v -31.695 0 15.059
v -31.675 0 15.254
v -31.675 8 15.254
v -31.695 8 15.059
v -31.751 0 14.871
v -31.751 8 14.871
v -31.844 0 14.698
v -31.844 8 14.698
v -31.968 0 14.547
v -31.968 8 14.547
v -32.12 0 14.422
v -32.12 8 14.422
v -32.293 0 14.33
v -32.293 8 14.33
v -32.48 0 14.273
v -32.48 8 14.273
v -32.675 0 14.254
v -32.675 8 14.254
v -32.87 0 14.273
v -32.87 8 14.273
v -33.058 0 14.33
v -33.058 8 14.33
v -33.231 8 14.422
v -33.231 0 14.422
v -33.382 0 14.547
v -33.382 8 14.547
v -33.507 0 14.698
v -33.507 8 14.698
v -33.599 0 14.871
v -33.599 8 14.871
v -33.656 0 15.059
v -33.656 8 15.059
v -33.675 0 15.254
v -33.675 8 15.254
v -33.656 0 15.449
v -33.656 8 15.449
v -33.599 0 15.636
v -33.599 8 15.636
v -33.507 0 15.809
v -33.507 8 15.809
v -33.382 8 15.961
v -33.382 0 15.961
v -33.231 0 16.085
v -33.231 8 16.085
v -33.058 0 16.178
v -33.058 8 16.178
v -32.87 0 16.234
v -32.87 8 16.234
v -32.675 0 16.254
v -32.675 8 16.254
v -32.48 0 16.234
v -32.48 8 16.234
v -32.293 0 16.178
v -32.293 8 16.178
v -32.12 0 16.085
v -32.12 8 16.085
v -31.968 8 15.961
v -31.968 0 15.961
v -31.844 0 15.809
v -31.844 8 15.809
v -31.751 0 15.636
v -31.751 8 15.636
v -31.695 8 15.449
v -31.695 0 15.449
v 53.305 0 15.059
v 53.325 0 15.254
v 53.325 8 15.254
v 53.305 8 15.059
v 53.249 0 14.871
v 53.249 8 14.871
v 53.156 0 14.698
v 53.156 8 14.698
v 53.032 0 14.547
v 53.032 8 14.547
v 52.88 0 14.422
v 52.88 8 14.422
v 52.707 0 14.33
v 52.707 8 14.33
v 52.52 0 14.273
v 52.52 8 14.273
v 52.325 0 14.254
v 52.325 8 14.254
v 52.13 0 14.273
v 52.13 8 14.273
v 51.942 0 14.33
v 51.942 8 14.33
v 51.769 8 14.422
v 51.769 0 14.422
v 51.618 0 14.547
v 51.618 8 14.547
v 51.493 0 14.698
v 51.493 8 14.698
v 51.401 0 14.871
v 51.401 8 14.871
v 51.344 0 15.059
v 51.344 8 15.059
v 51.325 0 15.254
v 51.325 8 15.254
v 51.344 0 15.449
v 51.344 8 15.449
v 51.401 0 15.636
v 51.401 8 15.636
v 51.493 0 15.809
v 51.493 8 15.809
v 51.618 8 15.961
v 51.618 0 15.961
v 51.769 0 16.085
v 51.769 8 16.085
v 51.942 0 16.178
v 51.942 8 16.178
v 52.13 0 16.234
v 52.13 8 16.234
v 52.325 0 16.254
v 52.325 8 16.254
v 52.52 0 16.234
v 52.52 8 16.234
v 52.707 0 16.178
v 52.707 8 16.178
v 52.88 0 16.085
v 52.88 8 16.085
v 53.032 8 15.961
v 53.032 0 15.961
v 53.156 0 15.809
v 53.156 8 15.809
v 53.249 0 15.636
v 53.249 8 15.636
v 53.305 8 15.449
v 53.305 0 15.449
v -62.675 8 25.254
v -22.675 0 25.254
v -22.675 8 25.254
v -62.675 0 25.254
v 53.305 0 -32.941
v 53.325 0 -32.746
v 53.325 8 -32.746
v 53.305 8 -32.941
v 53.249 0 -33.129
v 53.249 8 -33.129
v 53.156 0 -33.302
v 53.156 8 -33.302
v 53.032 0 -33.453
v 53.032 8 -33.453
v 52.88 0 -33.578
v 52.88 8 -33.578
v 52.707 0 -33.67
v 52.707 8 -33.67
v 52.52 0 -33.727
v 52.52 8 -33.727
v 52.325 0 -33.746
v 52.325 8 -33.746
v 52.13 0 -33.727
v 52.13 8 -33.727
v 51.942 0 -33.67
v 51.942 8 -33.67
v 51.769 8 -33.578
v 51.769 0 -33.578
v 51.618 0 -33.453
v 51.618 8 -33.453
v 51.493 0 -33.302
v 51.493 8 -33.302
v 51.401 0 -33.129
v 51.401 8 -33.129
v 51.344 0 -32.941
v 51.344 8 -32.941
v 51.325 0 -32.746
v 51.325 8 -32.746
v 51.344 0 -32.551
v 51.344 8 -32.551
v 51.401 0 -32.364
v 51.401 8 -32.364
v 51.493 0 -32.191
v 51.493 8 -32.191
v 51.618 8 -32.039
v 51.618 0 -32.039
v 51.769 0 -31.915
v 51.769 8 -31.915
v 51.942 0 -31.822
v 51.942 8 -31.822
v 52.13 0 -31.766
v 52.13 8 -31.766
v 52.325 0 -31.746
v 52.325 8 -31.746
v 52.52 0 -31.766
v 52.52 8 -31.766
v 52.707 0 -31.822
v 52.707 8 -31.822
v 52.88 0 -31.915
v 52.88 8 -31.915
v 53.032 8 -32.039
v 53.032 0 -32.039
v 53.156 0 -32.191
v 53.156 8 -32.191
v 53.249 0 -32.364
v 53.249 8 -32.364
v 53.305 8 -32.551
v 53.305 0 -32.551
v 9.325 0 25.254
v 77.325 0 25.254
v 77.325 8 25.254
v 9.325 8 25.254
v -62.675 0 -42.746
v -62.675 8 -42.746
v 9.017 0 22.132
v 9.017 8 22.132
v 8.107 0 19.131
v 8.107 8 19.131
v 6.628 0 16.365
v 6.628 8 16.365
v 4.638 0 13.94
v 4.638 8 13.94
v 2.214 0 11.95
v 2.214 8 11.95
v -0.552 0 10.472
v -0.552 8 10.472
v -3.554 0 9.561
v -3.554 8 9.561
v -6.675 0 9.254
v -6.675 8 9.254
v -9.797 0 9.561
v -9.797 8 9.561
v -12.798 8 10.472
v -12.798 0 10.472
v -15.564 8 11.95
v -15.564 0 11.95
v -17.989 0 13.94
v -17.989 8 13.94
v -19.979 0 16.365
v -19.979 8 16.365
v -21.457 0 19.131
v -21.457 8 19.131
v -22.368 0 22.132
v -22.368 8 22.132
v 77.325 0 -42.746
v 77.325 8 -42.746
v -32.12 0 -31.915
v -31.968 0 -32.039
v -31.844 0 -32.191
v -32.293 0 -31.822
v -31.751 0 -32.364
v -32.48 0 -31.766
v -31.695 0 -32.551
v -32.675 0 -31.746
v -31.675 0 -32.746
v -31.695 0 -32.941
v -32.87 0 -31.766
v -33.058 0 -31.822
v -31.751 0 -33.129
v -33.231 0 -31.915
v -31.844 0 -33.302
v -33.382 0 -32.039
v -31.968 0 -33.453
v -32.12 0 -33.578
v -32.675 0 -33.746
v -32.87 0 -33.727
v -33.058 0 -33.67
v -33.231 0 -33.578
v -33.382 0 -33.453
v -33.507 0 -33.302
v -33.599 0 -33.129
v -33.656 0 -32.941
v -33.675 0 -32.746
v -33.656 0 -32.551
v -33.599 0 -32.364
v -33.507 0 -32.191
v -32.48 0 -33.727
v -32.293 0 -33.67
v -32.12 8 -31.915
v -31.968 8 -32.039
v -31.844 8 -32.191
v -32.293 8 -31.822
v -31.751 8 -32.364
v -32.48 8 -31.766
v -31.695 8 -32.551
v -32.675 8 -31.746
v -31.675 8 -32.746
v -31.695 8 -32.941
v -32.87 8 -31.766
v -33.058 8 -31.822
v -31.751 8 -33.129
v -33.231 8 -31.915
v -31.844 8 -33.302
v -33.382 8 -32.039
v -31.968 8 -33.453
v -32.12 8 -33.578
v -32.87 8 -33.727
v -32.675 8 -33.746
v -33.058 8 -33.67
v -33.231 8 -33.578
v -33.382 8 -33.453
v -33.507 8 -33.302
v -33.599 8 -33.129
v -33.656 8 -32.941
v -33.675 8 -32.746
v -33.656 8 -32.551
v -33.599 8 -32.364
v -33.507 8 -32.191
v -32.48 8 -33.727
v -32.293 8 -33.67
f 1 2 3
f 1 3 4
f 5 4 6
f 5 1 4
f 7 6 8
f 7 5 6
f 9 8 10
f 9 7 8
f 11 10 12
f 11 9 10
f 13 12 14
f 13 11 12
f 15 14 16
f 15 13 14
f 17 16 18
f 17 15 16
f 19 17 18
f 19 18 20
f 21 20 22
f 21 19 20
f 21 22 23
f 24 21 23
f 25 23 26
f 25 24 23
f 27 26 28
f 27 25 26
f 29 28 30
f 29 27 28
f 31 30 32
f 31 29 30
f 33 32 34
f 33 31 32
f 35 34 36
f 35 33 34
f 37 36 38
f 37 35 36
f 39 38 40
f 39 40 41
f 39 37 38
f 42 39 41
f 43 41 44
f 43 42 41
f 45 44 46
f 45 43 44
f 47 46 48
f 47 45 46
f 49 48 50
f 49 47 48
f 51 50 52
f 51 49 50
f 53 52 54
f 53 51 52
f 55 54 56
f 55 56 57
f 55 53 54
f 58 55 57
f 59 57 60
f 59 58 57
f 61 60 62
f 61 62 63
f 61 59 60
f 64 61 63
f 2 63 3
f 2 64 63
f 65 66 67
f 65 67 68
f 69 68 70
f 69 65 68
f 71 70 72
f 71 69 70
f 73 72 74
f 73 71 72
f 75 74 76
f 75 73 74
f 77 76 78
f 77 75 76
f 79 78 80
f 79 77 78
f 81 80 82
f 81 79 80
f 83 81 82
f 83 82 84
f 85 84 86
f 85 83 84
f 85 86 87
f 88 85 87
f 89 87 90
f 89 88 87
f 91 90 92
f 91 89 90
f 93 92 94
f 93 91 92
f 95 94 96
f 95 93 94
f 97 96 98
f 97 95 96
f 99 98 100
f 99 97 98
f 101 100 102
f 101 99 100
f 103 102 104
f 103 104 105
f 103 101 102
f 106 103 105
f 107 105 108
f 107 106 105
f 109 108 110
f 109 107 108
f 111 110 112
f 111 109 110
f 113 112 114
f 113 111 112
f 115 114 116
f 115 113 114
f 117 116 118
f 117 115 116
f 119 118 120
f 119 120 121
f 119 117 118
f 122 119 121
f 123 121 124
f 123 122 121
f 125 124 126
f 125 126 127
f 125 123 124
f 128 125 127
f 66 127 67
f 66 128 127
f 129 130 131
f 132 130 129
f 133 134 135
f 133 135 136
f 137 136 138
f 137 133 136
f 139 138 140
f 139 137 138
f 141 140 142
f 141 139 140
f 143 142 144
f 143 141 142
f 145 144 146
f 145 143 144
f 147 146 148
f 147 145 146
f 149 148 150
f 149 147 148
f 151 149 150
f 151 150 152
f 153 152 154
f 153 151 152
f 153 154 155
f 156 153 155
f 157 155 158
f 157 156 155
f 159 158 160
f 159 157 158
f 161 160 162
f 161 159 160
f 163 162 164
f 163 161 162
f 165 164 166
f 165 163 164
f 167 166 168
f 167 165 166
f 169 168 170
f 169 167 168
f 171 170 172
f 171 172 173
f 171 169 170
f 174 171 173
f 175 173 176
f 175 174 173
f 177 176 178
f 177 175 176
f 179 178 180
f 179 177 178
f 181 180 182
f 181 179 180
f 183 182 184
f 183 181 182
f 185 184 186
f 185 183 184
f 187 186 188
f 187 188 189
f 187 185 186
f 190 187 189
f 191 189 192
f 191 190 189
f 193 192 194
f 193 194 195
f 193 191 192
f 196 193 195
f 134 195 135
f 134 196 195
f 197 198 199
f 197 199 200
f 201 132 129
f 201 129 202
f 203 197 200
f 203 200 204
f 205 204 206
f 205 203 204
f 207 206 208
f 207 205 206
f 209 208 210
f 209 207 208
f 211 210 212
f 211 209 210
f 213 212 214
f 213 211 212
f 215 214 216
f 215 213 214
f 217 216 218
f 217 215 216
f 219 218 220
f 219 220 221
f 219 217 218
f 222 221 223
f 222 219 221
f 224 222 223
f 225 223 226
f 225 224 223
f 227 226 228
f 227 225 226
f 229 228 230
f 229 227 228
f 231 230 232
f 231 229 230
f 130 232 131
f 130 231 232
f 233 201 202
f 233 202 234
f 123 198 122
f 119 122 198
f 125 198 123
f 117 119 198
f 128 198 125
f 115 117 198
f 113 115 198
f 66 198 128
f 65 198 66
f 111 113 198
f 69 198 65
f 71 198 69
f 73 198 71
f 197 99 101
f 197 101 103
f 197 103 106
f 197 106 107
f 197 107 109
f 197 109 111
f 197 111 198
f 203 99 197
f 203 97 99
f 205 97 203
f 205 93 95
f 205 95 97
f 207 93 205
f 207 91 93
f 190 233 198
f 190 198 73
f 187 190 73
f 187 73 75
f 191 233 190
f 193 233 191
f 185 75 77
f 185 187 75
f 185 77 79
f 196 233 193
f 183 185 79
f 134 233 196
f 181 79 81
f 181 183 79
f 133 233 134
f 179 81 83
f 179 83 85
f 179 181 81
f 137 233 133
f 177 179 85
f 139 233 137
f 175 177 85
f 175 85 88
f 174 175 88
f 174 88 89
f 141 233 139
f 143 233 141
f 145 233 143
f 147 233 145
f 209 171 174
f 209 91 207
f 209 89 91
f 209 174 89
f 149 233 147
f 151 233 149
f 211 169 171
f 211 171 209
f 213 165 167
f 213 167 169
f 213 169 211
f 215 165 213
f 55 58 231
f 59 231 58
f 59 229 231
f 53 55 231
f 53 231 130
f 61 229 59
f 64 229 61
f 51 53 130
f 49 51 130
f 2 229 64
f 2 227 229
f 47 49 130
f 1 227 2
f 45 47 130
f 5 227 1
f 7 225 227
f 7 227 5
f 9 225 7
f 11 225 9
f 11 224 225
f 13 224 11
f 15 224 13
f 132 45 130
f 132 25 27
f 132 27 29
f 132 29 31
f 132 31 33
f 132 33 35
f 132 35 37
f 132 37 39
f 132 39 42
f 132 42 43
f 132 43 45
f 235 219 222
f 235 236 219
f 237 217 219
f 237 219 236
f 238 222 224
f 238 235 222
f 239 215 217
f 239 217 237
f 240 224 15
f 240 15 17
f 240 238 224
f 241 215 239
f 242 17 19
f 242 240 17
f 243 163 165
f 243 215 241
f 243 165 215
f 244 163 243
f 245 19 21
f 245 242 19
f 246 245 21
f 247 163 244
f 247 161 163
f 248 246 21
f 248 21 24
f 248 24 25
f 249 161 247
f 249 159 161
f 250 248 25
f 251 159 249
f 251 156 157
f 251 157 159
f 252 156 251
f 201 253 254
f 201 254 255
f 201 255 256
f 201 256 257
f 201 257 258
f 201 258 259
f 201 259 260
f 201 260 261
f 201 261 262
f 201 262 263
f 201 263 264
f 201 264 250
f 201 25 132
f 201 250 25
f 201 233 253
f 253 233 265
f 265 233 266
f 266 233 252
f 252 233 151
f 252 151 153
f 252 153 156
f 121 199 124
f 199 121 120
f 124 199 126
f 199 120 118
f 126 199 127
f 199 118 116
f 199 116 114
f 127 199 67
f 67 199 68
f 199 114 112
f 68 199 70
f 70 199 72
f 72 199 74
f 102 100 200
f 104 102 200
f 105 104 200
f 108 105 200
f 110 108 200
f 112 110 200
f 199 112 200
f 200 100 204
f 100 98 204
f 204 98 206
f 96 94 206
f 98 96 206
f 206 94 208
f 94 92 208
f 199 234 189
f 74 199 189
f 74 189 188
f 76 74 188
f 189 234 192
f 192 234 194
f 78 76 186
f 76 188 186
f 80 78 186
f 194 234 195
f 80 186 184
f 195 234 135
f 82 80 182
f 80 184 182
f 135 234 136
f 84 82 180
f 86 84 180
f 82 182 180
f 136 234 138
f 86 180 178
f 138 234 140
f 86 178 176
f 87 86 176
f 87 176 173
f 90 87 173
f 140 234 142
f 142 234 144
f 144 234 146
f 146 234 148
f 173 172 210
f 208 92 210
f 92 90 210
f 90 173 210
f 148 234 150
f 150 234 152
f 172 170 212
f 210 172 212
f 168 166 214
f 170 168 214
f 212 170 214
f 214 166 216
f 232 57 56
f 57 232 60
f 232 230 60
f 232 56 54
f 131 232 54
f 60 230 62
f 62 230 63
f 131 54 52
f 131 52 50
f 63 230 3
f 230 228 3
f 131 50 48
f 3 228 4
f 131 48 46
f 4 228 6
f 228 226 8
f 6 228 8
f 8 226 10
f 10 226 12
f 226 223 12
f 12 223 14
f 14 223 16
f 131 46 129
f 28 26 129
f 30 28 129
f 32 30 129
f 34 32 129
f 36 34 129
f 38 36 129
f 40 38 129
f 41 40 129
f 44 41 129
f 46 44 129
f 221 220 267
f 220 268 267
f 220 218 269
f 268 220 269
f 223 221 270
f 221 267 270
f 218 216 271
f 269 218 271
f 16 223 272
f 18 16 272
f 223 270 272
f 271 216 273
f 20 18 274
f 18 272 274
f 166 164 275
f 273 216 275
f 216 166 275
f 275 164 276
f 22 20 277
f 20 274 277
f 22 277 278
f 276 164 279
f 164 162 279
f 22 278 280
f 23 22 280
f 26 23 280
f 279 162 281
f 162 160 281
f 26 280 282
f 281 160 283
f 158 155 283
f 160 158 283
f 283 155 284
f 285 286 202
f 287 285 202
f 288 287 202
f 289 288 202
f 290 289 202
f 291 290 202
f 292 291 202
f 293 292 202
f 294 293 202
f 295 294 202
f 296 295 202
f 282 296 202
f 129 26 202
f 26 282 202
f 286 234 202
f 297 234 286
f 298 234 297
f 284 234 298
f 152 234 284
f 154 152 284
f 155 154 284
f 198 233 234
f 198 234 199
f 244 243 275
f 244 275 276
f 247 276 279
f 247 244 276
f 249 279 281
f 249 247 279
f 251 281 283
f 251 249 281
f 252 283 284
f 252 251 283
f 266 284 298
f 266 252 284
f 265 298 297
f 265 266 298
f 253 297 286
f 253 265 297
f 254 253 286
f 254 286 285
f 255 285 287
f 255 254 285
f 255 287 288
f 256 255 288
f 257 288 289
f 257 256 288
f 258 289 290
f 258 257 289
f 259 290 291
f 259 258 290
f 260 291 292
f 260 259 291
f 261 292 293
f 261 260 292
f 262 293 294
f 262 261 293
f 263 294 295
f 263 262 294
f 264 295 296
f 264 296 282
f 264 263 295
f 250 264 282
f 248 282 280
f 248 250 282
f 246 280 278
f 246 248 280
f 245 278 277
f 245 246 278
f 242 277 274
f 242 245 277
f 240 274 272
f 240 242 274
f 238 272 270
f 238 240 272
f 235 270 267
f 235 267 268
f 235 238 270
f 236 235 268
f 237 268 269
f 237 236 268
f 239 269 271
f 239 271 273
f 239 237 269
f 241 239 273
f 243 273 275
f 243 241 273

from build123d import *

# Parameters (mm, degrees)
SKETCH1_R           = 1
BOSS_EXTRUDE1_DEPTH = 8


with BuildPart() as part:
    # Sketch1 → Boss-Extrude1 (new body)
    with BuildSketch(Plane(origin=(0, 0, 0), x_dir=(1, 0, 0), z_dir=(0, 1, 0))):
        with BuildLine():
            Line((-62.675339064, 42.746325997), (77.324660936, 42.746325997))
            Line((77.324660936, 42.746325997), (77.324660936, -25.253674003))
            Line((77.324660936, -25.253674003), (9.324660936, -25.253674003))
            ThreePointArc((9.324660936, -25.253674003), (-6.675339064, -9.253674003), (-22.675339064, -25.253674003))
            Line((-22.675339064, -25.253674003), (-62.675339064, -25.253674003))
            Line((-62.675339064, -25.253674003), (-62.675339064, 42.746325997))
        make_face()
        with Locations((-32.675339064, 32.746325997)):
            Circle(SKETCH1_R, mode=Mode.SUBTRACT)
        with Locations((-32.675339064, -15.253674003)):
            Circle(SKETCH1_R, mode=Mode.SUBTRACT)
        with Locations((52.324660936, 32.746325997)):
            Circle(SKETCH1_R, mode=Mode.SUBTRACT)
        with Locations((52.324660936, -15.253674003)):
            Circle(SKETCH1_R, mode=Mode.SUBTRACT)
    extrude(amount=BOSS_EXTRUDE1_DEPTH)


solid = part.part
